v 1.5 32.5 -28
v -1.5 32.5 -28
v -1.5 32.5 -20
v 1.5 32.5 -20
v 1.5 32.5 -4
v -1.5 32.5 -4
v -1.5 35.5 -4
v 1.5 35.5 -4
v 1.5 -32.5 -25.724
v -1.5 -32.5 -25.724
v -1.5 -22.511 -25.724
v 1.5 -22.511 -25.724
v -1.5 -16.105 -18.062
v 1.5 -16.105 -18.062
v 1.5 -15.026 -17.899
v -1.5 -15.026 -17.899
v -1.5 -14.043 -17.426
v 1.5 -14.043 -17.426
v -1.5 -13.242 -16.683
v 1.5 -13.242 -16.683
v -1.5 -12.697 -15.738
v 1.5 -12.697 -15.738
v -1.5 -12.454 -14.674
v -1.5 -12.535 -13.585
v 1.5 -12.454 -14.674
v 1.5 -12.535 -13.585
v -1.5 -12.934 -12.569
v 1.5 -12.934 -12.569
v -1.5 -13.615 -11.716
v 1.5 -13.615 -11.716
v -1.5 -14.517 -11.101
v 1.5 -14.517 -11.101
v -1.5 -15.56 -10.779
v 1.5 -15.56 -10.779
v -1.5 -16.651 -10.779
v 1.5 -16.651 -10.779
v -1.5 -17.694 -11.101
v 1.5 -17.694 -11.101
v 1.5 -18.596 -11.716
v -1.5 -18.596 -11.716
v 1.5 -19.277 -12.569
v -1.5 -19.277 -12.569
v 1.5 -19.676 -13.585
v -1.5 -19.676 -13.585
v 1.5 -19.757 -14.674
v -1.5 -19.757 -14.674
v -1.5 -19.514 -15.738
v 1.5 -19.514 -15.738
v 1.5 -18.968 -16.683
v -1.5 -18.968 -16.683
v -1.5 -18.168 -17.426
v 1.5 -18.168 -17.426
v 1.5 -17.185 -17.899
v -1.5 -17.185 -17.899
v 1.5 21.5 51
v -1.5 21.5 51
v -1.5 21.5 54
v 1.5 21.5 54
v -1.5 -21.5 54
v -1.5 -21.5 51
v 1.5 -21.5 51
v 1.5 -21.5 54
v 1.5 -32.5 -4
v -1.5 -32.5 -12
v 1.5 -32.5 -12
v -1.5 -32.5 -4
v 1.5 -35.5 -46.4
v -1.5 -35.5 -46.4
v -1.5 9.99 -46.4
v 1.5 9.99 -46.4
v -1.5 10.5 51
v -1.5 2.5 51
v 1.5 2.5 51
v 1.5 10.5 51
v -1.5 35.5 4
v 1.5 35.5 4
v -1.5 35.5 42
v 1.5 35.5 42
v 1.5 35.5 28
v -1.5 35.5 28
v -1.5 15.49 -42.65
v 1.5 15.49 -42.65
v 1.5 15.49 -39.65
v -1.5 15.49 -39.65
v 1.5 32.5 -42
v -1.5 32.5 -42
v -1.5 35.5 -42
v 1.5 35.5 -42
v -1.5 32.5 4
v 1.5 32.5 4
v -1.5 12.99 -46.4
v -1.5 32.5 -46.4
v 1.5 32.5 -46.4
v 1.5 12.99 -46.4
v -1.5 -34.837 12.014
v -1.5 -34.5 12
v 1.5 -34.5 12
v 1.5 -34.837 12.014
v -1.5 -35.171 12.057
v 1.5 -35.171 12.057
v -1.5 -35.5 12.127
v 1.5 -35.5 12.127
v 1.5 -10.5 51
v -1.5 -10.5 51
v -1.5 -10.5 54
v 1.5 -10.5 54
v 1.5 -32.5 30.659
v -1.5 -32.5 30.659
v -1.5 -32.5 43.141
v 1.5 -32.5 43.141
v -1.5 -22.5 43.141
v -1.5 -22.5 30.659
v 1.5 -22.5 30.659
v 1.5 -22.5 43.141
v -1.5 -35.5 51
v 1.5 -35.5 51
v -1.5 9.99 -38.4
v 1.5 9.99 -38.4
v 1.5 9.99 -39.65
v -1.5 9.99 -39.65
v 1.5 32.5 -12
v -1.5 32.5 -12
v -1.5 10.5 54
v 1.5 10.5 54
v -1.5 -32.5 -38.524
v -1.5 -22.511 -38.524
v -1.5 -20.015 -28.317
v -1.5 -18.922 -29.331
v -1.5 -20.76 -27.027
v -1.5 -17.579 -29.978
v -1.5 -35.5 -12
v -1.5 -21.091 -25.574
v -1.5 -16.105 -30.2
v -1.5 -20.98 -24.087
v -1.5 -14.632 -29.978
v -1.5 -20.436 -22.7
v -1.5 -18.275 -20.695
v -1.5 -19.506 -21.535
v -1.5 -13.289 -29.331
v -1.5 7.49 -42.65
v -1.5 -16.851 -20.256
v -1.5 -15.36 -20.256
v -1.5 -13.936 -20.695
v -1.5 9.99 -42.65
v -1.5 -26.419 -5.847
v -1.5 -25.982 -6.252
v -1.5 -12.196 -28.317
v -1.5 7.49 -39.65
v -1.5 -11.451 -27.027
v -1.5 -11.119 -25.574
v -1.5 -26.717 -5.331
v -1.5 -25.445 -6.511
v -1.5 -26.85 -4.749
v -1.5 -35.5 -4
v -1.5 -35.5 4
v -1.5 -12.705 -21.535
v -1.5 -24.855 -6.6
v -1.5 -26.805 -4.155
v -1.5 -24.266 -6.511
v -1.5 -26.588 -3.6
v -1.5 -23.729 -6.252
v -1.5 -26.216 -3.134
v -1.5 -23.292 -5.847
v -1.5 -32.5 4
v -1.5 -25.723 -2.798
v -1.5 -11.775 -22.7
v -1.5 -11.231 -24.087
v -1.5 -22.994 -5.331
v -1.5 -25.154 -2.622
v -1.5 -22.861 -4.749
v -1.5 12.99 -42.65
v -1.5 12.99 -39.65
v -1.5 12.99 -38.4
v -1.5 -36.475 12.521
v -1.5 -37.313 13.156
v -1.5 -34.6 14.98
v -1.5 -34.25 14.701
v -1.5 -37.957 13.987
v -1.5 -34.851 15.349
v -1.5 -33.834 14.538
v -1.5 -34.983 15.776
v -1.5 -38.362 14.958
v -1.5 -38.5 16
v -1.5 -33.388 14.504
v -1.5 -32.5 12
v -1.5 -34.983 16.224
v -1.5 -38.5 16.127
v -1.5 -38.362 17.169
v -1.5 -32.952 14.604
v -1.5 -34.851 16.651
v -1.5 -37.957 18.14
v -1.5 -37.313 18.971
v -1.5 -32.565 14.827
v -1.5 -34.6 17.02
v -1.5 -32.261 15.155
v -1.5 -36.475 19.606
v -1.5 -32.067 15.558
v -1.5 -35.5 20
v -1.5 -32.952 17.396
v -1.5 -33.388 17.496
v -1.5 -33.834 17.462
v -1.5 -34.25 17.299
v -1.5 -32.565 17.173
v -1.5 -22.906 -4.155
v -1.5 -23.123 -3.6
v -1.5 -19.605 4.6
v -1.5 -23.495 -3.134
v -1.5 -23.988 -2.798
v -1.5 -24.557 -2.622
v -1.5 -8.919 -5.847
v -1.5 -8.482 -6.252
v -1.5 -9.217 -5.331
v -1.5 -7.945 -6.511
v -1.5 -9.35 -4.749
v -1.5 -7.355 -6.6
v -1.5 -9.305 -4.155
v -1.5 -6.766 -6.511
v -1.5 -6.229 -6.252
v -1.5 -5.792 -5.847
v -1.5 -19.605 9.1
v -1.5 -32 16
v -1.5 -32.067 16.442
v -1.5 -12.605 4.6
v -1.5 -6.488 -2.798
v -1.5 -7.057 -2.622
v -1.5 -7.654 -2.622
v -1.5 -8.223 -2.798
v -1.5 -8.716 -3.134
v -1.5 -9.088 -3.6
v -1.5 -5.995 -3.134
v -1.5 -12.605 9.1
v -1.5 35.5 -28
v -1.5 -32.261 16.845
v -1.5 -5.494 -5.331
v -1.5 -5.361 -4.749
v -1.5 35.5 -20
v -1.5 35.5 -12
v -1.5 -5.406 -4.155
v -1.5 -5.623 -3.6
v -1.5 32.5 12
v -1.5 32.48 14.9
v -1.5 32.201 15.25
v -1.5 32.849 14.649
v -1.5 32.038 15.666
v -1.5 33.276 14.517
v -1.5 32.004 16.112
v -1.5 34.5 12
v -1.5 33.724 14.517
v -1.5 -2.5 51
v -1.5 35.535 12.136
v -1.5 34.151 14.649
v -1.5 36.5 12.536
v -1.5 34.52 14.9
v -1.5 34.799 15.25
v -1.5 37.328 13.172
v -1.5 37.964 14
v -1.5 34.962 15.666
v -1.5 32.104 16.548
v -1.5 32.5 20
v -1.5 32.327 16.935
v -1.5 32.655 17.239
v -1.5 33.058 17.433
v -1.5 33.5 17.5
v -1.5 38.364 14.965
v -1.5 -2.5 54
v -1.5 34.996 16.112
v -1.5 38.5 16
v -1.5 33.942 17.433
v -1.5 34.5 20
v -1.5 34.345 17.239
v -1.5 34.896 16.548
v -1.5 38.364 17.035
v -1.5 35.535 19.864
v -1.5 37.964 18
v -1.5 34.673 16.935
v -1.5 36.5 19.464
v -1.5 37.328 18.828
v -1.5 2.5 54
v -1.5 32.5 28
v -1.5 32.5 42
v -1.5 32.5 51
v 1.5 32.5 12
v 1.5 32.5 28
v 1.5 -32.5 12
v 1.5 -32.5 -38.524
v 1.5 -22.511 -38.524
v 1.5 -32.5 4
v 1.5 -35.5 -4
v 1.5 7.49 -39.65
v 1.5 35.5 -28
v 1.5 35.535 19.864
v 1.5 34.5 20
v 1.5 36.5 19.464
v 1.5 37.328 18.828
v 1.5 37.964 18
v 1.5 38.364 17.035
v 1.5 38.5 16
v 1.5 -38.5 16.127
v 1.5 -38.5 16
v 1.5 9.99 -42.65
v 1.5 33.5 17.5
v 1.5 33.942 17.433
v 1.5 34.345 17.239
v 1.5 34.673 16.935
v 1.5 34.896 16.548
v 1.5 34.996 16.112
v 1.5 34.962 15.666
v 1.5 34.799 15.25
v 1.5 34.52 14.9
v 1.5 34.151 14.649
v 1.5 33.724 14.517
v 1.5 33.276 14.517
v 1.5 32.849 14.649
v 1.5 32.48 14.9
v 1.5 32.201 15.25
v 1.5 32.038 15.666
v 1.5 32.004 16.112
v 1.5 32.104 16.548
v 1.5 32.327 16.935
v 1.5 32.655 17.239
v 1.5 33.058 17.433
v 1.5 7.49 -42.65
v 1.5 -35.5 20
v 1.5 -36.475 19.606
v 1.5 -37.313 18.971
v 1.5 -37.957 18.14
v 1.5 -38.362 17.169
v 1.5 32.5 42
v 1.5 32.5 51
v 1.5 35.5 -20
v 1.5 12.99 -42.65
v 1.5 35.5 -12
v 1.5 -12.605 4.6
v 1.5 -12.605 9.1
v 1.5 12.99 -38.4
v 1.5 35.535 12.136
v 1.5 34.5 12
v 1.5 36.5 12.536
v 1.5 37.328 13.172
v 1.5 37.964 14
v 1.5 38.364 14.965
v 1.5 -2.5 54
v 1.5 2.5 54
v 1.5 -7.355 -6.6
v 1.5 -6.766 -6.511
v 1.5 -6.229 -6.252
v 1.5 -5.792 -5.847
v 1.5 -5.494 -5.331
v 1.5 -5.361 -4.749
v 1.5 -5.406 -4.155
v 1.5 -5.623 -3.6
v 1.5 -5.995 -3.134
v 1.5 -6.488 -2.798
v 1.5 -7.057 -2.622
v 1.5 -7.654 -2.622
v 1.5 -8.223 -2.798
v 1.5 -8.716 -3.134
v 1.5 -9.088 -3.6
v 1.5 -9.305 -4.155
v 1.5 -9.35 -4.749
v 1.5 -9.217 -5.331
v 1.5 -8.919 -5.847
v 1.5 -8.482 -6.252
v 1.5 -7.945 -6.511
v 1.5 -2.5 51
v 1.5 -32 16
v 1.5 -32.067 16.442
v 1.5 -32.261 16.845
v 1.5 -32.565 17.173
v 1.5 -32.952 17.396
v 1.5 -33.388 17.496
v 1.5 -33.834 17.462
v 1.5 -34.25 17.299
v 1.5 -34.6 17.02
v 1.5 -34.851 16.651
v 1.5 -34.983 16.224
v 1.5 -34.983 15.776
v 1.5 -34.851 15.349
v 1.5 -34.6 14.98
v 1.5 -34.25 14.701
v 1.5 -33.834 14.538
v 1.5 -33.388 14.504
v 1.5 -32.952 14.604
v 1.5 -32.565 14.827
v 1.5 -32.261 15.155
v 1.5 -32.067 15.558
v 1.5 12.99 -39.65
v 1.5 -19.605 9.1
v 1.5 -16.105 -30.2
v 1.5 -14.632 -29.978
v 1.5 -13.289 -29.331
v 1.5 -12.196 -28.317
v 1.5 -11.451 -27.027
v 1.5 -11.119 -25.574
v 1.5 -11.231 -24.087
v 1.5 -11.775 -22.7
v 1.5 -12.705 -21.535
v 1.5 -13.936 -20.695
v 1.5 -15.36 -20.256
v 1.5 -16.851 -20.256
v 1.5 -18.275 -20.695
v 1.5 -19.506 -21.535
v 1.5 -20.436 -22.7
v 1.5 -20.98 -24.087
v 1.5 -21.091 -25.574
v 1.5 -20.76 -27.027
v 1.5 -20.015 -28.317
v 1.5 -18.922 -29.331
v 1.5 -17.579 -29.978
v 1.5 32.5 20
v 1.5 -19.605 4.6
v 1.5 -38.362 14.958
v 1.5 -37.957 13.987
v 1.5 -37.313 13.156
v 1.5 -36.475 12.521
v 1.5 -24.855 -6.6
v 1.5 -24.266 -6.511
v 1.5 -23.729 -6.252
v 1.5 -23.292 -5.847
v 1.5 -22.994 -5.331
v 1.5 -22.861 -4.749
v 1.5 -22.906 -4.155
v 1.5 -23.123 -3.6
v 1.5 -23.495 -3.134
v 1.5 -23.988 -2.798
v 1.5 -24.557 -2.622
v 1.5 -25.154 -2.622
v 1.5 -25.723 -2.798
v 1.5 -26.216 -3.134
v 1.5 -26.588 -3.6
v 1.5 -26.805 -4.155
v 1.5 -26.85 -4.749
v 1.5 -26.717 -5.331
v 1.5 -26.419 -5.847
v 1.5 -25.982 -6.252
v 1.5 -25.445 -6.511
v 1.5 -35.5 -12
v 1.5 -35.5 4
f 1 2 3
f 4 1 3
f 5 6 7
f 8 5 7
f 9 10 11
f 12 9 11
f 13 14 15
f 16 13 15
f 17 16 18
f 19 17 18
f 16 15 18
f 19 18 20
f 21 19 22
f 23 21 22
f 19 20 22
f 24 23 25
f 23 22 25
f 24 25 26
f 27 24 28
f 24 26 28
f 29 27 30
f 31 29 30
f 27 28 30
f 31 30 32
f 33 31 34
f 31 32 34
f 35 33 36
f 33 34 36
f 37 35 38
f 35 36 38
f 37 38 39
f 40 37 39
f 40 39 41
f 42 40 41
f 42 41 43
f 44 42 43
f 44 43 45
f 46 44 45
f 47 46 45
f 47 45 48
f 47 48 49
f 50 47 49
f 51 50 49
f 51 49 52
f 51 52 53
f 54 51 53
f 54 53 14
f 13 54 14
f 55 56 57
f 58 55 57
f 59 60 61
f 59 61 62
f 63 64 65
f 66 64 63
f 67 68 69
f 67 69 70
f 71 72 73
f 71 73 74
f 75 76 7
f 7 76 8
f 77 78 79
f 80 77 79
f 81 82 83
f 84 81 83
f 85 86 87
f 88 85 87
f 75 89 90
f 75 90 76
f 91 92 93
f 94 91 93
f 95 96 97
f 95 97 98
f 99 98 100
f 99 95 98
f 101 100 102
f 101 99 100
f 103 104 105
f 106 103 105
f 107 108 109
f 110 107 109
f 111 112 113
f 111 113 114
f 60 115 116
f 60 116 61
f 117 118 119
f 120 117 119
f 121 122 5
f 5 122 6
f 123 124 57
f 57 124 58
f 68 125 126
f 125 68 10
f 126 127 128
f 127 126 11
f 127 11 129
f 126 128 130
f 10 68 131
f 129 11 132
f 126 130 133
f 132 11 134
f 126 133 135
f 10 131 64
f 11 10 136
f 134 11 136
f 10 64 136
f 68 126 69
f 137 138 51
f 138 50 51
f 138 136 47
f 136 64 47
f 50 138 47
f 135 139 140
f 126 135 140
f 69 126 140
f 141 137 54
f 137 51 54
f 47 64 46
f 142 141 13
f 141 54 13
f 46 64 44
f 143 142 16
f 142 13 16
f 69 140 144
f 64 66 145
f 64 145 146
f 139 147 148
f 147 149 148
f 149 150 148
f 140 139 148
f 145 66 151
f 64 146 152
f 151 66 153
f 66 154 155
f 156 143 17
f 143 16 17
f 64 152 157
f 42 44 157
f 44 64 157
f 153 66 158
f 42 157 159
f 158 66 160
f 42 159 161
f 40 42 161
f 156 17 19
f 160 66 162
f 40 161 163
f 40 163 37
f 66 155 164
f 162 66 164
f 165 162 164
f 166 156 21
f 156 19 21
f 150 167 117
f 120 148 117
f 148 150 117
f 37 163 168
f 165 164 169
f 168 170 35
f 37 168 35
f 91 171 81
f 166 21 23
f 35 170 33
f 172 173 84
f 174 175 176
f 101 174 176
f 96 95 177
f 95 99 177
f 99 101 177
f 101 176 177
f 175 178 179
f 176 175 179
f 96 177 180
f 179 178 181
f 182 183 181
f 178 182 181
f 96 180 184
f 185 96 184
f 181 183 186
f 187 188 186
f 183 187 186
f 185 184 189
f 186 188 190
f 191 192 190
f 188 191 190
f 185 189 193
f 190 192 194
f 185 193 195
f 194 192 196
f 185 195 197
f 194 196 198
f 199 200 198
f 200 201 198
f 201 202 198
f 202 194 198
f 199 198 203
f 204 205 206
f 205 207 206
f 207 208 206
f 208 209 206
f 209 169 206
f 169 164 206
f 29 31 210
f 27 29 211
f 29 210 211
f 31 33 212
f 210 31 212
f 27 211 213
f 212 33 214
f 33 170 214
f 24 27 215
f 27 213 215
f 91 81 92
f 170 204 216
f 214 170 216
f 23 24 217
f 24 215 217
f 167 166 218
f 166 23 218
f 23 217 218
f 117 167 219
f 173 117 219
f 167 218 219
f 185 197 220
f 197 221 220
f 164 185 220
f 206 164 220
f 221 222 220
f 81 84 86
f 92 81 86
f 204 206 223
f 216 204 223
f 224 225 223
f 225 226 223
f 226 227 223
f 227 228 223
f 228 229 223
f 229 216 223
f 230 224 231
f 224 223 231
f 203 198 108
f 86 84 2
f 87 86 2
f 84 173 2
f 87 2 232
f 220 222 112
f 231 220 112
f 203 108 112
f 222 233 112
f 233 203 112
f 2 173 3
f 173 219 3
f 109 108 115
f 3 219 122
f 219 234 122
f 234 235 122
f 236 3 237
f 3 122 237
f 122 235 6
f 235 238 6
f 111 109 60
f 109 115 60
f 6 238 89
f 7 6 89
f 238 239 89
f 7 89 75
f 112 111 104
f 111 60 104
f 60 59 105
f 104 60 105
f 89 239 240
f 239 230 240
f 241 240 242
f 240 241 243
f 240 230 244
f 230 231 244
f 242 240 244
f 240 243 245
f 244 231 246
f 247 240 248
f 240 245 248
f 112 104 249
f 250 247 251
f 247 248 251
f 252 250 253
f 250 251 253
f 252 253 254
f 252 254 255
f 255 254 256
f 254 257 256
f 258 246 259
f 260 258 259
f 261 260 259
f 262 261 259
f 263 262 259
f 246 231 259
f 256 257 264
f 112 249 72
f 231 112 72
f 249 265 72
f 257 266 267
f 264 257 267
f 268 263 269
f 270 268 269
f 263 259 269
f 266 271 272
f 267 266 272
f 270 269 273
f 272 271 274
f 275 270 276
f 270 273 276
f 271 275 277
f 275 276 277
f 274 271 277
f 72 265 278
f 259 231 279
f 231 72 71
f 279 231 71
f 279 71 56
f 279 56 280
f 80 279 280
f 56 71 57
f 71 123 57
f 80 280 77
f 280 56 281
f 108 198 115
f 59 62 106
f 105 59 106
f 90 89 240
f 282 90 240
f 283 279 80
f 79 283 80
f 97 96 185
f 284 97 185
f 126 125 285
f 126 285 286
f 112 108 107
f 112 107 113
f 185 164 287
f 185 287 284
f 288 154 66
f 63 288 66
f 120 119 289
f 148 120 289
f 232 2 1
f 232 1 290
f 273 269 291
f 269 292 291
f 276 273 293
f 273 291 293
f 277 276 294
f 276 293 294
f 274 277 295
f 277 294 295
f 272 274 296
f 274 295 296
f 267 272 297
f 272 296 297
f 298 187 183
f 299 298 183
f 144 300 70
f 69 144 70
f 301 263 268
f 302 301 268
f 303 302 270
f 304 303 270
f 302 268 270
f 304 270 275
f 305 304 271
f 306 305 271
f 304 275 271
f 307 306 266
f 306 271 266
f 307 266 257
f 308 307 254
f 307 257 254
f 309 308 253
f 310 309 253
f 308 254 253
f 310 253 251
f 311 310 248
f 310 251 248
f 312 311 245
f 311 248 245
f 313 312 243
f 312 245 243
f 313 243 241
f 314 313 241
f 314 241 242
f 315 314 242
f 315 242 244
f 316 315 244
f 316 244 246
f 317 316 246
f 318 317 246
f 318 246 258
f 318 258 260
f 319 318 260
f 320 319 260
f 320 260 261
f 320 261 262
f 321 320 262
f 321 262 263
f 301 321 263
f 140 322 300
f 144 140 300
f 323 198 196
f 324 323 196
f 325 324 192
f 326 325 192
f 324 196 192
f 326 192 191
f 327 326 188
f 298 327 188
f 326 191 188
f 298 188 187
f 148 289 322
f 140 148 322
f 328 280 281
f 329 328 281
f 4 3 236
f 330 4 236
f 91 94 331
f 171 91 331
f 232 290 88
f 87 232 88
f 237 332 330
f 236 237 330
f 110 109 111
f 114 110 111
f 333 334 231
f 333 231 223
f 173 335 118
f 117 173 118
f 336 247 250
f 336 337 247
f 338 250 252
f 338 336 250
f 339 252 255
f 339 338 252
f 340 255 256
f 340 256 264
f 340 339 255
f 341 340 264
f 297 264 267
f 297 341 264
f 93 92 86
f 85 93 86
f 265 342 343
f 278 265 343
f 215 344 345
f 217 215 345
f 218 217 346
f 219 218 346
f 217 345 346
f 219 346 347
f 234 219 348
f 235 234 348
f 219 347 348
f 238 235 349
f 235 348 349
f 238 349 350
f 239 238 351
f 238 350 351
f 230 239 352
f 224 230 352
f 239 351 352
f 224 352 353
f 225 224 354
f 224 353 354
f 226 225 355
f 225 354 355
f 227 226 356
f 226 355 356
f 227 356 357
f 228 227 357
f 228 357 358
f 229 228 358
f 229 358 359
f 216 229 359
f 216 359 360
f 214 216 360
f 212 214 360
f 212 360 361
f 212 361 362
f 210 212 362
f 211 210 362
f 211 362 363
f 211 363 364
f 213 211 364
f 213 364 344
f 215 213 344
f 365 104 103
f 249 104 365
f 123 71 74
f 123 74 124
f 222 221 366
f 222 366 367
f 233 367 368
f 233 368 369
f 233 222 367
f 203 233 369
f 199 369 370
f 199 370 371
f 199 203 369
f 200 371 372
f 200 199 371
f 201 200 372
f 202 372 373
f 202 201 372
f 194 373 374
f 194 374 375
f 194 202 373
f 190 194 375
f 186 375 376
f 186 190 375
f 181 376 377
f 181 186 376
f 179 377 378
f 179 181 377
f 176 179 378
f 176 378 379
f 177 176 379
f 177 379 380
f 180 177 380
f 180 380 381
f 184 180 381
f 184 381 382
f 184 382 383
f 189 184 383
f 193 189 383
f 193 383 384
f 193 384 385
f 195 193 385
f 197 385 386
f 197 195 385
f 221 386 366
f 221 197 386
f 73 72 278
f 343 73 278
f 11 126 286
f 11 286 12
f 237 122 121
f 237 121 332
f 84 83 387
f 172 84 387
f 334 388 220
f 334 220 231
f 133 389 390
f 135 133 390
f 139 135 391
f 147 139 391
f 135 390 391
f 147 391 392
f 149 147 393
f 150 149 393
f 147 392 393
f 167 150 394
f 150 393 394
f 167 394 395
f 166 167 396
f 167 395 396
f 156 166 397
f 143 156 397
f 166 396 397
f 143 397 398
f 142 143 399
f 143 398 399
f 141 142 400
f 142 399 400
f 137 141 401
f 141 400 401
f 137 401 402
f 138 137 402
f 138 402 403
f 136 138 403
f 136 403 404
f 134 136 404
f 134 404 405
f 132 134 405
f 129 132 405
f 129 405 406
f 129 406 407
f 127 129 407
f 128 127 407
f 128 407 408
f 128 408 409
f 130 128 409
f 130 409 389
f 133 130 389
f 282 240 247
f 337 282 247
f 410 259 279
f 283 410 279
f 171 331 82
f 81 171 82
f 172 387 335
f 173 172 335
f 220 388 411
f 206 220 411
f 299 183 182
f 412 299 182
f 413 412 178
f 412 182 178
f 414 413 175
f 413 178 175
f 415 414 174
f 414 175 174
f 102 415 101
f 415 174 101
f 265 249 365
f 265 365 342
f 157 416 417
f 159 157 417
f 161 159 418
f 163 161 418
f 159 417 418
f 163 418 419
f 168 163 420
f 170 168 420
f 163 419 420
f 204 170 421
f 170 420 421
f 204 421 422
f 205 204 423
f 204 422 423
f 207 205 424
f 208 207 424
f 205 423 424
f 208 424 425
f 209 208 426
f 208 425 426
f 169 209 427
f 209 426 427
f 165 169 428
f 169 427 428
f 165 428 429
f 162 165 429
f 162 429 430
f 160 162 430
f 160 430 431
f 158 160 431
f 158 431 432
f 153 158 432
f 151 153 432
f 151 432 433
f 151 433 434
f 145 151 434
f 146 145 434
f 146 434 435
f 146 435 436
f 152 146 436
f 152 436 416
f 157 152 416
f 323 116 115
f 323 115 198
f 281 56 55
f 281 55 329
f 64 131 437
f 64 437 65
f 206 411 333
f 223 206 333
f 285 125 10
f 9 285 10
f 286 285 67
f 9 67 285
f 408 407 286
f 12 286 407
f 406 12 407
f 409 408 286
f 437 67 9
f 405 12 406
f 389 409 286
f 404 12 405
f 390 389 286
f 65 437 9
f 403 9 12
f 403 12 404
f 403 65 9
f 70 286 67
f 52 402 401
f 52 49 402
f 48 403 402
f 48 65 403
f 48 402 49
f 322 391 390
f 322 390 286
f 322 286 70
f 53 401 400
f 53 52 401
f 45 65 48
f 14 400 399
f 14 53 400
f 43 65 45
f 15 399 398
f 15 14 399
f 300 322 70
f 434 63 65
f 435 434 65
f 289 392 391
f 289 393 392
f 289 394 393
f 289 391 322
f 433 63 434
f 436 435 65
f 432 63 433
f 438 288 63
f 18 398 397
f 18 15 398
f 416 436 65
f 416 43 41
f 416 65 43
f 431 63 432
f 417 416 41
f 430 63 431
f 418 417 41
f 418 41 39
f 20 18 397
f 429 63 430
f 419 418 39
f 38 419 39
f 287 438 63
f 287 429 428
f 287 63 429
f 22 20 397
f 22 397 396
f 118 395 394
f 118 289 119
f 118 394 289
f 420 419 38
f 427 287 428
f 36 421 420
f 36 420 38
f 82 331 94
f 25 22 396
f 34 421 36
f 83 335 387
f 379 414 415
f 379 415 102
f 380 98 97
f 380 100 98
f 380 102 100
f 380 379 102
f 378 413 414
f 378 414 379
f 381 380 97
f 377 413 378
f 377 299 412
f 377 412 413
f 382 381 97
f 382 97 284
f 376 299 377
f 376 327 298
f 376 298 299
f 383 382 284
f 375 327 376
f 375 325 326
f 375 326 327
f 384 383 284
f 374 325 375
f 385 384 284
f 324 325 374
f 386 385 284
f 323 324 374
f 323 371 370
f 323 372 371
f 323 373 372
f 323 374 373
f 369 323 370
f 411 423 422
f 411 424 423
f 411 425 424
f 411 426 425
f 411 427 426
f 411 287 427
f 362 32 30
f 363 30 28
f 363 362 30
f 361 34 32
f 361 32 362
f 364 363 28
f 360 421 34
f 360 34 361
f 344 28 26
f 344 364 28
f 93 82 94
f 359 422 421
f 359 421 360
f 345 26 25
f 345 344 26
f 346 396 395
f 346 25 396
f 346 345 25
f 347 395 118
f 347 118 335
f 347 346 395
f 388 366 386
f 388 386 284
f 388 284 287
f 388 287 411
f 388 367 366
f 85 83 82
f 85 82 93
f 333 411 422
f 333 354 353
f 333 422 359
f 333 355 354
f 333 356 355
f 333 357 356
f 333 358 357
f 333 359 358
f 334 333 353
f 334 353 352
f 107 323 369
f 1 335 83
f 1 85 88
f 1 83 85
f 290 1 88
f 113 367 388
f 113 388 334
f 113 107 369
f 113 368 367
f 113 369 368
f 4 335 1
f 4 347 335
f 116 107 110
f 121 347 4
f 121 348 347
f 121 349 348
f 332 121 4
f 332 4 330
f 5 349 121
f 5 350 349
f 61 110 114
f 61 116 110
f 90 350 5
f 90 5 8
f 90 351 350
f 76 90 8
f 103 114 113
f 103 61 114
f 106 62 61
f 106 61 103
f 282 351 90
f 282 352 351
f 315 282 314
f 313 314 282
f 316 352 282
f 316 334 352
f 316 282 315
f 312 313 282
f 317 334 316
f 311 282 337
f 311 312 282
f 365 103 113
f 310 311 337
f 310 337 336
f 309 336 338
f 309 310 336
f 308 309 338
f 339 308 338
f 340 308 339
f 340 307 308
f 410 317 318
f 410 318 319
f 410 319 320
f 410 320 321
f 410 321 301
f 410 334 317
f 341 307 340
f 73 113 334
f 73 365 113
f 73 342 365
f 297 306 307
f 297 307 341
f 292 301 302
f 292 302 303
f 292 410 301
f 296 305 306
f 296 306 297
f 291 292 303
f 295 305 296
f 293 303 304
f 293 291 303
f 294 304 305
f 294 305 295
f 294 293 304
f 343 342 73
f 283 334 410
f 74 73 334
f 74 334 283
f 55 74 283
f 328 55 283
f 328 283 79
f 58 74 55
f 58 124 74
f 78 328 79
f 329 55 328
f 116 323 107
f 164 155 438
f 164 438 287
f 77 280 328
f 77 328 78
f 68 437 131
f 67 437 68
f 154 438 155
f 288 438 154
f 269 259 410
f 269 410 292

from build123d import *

# Parameters (mm, degrees)
CROQUIS1_W              = 108
CROQUIS1_H              = 71
SALIENTE_EXTRUIR1_DEPTH = 1.5
CROQUIS2_W              = 8
CROQUIS2_H              = 3
CROQUIS2_W_2            = 12
CORTAR_EXTRUIR1_DEPTH   = 3
CROQUIS4_W              = 8
CROQUIS4_H              = 3
SALIENTE_EXTRUIR2_DEPTH = 3
REDONDEO1_R             = 4
CROQUIS5_R              = 1.5
CORTAR_EXTRUIR2_DEPTH   = 13
SIMETR_A2_START         = -1.5
SIMETR_A2_OUTLINE_R     = 1.5
SIMETR_A2_DEPTH         = 3
SIMETR_A2_2_DEPTH       = 3
CROQUIS6_W              = 3
CROQUIS6_H              = 14
CROQUIS6_H_2            = 8
CORTAR_EXTRUIR3_DEPTH   = 3
CROQUIS7_W              = 3.217414859
CROQUIS7_H              = 7.6
CORTAR_EXTRUIR4_DEPTH   = 73
CROQUIS10_W             = 12.8
CROQUIS10_H             = 9.989091156
CORTAR_EXTRUIR7_DEPTH   = 10
CROQUIS11_W             = 12.481361742
CROQUIS11_H             = 10
CORTAR_EXTRUIR8_DEPTH   = 10
CROQUIS12_R             = 2
CROQUIS12_R_2           = 3.661926667
CROQUIS12_R_3           = 5
CROQUIS12_W             = 4.5
CROQUIS12_H             = 7
CORTAR_EXTRUIR9_DEPTH   = 10
CORTAR_EXTRUIR10_DEPTH  = 10


# Read off the part's stored shape, not the designer's step: Simetría2
with BuildPart() as part:
    # Croquis1 → Saliente-Extruir1 (new, symmetric)
    with BuildSketch(Plane(origin=(0, 0, 0), x_dir=(0, 0, -1), z_dir=(1, 0, 0))):
        Rectangle(CROQUIS1_W, CROQUIS1_H)
    extrude(amount=SALIENTE_EXTRUIR1_DEPTH, both=True)

    # Croquis2 → Cortar-Extruir1 (cut)
    with BuildSketch(Plane.ZY.offset(1.5)):
        with Locations((-8, -34)):
            Rectangle(CROQUIS2_W, CROQUIS2_H)
        with Locations((8, -34)):
            Rectangle(CROQUIS2_W, CROQUIS2_H)
        with Locations((48, 34)):
            Rectangle(CROQUIS2_W_2, CROQUIS2_H)
        with Locations((24, 34)):
            Rectangle(CROQUIS2_W, CROQUIS2_H)
        with Locations((8, 34)):
            Rectangle(CROQUIS2_W, CROQUIS2_H)
        with Locations((-8, 34)):
            Rectangle(CROQUIS2_W, CROQUIS2_H)
        with Locations((-24, 34)):
            Rectangle(CROQUIS2_W, CROQUIS2_H)
        with Locations((-48, 34)):
            Rectangle(CROQUIS2_W_2, CROQUIS2_H)
    extrude(amount=-CORTAR_EXTRUIR1_DEPTH, mode=Mode.SUBTRACT)

    # Croquis4 → Saliente-Extruir2 (add)
    with BuildSketch(Plane.ZY.offset(1.5)):
        with Locations((16, 37)):
            Rectangle(CROQUIS4_W, CROQUIS4_H)
    extrude(amount=-SALIENTE_EXTRUIR2_DEPTH)

    # Redondeo1
    redondeo1_edges = [part.edges().sort_by_distance(p)[0] for p in [
        (0, 38.5, 20),
        (0, 38.5, 12),
    ]]
    fillet(redondeo1_edges, radius=REDONDEO1_R - 0.0001)  # a hair under: the kernel refuses the full size

    # Croquis5 → Cortar-Extruir2 (cut)
    with BuildSketch(Plane.ZY.offset(1.5)):
        with Locations((16, 33.5)):
            Circle(CROQUIS5_R)
    extrude(amount=-CORTAR_EXTRUIR2_DEPTH, mode=Mode.SUBTRACT)

    # Simetría2 outline → Simetría2 (cut)
    with BuildSketch(Plane.YZ.offset(SIMETR_A2_START)):
        with BuildLine():
            ThreePointArc((-34.5, 12), (-35.00401717, 12.031881215), (-35.5, 12.127016654))
            Line((-35.5, 12.127016654), (-35.5, 12))
            Line((-35.5, 12), (-34.5, 12))
        make_face()
        with Locations((-33.5, 16)):
            Circle(SIMETR_A2_OUTLINE_R)
    extrude(amount=SIMETR_A2_DEPTH, mode=Mode.SUBTRACT)

    # Simetr_a2 2 outline → Simetr_a2 2 (add)
    with BuildSketch(Plane.YZ.offset(SIMETR_A2_START)):
        with BuildLine():
            ThreePointArc((-35.5, 20), (-37.66227766, 18.576506397), (-38.5, 16.127016654))
            Line((-38.5, 16.127016654), (-38.5, 16))
            ThreePointArc((-38.5, 16), (-37.66227766, 13.550510257), (-35.5, 12.127016654))
            Line((-35.5, 12.127016654), (-35.5, 20))
        make_face()
    extrude(amount=SIMETR_A2_2_DEPTH)

    # Croquis6 → Cortar-Extruir3 (cut)
    with BuildSketch(Plane.ZY.offset(1.5)):
        with Locations((52.5, -28.5)):
            Rectangle(CROQUIS6_W, CROQUIS6_H)
        with Locations((52.5, -6.5)):
            Rectangle(CROQUIS6_W, CROQUIS6_H_2)
        with Locations((52.5, 6.5)):
            Rectangle(CROQUIS6_W, CROQUIS6_H_2)
        with Locations((52.5, 28.5)):
            Rectangle(CROQUIS6_W, CROQUIS6_H)
    extrude(amount=-CORTAR_EXTRUIR3_DEPTH, mode=Mode.SUBTRACT)

    # Croquis7 → Cortar-Extruir4 (cut)
    with BuildSketch(Plane(origin=(0, 32.5, 0), x_dir=(1, 0, 0), z_dir=(0, 1, 0))):
        with Locations((-0.10870743, 50.2)):
            Rectangle(CROQUIS7_W, CROQUIS7_H)
    extrude(amount=-CORTAR_EXTRUIR4_DEPTH, mode=Mode.SUBTRACT)

    # Croquis10 → Cortar-Extruir7 (cut)
    with BuildSketch(Plane.ZY.offset(1.5)):
        with Locations((-32.123797493, -27.505454422)):
            Rectangle(CROQUIS10_W, CROQUIS10_H)
    extrude(amount=-CORTAR_EXTRUIR7_DEPTH, mode=Mode.SUBTRACT)

    # Croquis11 → Cortar-Extruir8 (cut)
    with BuildSketch(Plane.ZY.offset(1.5)):
        with Locations((36.9, -27.5)):
            Rectangle(CROQUIS11_W, CROQUIS11_H)
    extrude(amount=-CORTAR_EXTRUIR8_DEPTH, mode=Mode.SUBTRACT)

    # Croquis12 → Cortar-Extruir9 (cut)
    with BuildSketch(Plane(origin=(1.5, 0, 0), x_dir=(0, 0, -1), z_dir=(1, 0, 0))):
        with Locations((4.6, -7.355454422)):
            Circle(CROQUIS12_R)
        with Locations((4.6, -24.855454422)):
            Circle(CROQUIS12_R)
        with Locations((14.4, -16.105454422)):
            Circle(CROQUIS12_R_2)
        with Locations((25.2, -16.105454422)):
            Circle(CROQUIS12_R_3)
        with Locations((-6.85, -16.105454422)):
            Rectangle(CROQUIS12_W, CROQUIS12_H)
    extrude(amount=-CORTAR_EXTRUIR9_DEPTH, mode=Mode.SUBTRACT)

    # Croquis13 → Cortar-Extruir10 (cut)
    with BuildSketch(Plane(origin=(1.5, 0, 0), x_dir=(0, 0, -1), z_dir=(1, 0, 0))):
        Polygon((46.4, 9.99), (46.4, 12.99), (42.65, 12.99), (42.65, 15.49), (39.65, 15.49), (39.65, 12.99), (38.4, 12.99), (38.4, 9.99), (39.65, 9.99), (39.65, 7.49), (42.65, 7.49), (42.65, 9.99), align=None)
    extrude(amount=-CORTAR_EXTRUIR10_DEPTH, mode=Mode.SUBTRACT)


solid = part.part
